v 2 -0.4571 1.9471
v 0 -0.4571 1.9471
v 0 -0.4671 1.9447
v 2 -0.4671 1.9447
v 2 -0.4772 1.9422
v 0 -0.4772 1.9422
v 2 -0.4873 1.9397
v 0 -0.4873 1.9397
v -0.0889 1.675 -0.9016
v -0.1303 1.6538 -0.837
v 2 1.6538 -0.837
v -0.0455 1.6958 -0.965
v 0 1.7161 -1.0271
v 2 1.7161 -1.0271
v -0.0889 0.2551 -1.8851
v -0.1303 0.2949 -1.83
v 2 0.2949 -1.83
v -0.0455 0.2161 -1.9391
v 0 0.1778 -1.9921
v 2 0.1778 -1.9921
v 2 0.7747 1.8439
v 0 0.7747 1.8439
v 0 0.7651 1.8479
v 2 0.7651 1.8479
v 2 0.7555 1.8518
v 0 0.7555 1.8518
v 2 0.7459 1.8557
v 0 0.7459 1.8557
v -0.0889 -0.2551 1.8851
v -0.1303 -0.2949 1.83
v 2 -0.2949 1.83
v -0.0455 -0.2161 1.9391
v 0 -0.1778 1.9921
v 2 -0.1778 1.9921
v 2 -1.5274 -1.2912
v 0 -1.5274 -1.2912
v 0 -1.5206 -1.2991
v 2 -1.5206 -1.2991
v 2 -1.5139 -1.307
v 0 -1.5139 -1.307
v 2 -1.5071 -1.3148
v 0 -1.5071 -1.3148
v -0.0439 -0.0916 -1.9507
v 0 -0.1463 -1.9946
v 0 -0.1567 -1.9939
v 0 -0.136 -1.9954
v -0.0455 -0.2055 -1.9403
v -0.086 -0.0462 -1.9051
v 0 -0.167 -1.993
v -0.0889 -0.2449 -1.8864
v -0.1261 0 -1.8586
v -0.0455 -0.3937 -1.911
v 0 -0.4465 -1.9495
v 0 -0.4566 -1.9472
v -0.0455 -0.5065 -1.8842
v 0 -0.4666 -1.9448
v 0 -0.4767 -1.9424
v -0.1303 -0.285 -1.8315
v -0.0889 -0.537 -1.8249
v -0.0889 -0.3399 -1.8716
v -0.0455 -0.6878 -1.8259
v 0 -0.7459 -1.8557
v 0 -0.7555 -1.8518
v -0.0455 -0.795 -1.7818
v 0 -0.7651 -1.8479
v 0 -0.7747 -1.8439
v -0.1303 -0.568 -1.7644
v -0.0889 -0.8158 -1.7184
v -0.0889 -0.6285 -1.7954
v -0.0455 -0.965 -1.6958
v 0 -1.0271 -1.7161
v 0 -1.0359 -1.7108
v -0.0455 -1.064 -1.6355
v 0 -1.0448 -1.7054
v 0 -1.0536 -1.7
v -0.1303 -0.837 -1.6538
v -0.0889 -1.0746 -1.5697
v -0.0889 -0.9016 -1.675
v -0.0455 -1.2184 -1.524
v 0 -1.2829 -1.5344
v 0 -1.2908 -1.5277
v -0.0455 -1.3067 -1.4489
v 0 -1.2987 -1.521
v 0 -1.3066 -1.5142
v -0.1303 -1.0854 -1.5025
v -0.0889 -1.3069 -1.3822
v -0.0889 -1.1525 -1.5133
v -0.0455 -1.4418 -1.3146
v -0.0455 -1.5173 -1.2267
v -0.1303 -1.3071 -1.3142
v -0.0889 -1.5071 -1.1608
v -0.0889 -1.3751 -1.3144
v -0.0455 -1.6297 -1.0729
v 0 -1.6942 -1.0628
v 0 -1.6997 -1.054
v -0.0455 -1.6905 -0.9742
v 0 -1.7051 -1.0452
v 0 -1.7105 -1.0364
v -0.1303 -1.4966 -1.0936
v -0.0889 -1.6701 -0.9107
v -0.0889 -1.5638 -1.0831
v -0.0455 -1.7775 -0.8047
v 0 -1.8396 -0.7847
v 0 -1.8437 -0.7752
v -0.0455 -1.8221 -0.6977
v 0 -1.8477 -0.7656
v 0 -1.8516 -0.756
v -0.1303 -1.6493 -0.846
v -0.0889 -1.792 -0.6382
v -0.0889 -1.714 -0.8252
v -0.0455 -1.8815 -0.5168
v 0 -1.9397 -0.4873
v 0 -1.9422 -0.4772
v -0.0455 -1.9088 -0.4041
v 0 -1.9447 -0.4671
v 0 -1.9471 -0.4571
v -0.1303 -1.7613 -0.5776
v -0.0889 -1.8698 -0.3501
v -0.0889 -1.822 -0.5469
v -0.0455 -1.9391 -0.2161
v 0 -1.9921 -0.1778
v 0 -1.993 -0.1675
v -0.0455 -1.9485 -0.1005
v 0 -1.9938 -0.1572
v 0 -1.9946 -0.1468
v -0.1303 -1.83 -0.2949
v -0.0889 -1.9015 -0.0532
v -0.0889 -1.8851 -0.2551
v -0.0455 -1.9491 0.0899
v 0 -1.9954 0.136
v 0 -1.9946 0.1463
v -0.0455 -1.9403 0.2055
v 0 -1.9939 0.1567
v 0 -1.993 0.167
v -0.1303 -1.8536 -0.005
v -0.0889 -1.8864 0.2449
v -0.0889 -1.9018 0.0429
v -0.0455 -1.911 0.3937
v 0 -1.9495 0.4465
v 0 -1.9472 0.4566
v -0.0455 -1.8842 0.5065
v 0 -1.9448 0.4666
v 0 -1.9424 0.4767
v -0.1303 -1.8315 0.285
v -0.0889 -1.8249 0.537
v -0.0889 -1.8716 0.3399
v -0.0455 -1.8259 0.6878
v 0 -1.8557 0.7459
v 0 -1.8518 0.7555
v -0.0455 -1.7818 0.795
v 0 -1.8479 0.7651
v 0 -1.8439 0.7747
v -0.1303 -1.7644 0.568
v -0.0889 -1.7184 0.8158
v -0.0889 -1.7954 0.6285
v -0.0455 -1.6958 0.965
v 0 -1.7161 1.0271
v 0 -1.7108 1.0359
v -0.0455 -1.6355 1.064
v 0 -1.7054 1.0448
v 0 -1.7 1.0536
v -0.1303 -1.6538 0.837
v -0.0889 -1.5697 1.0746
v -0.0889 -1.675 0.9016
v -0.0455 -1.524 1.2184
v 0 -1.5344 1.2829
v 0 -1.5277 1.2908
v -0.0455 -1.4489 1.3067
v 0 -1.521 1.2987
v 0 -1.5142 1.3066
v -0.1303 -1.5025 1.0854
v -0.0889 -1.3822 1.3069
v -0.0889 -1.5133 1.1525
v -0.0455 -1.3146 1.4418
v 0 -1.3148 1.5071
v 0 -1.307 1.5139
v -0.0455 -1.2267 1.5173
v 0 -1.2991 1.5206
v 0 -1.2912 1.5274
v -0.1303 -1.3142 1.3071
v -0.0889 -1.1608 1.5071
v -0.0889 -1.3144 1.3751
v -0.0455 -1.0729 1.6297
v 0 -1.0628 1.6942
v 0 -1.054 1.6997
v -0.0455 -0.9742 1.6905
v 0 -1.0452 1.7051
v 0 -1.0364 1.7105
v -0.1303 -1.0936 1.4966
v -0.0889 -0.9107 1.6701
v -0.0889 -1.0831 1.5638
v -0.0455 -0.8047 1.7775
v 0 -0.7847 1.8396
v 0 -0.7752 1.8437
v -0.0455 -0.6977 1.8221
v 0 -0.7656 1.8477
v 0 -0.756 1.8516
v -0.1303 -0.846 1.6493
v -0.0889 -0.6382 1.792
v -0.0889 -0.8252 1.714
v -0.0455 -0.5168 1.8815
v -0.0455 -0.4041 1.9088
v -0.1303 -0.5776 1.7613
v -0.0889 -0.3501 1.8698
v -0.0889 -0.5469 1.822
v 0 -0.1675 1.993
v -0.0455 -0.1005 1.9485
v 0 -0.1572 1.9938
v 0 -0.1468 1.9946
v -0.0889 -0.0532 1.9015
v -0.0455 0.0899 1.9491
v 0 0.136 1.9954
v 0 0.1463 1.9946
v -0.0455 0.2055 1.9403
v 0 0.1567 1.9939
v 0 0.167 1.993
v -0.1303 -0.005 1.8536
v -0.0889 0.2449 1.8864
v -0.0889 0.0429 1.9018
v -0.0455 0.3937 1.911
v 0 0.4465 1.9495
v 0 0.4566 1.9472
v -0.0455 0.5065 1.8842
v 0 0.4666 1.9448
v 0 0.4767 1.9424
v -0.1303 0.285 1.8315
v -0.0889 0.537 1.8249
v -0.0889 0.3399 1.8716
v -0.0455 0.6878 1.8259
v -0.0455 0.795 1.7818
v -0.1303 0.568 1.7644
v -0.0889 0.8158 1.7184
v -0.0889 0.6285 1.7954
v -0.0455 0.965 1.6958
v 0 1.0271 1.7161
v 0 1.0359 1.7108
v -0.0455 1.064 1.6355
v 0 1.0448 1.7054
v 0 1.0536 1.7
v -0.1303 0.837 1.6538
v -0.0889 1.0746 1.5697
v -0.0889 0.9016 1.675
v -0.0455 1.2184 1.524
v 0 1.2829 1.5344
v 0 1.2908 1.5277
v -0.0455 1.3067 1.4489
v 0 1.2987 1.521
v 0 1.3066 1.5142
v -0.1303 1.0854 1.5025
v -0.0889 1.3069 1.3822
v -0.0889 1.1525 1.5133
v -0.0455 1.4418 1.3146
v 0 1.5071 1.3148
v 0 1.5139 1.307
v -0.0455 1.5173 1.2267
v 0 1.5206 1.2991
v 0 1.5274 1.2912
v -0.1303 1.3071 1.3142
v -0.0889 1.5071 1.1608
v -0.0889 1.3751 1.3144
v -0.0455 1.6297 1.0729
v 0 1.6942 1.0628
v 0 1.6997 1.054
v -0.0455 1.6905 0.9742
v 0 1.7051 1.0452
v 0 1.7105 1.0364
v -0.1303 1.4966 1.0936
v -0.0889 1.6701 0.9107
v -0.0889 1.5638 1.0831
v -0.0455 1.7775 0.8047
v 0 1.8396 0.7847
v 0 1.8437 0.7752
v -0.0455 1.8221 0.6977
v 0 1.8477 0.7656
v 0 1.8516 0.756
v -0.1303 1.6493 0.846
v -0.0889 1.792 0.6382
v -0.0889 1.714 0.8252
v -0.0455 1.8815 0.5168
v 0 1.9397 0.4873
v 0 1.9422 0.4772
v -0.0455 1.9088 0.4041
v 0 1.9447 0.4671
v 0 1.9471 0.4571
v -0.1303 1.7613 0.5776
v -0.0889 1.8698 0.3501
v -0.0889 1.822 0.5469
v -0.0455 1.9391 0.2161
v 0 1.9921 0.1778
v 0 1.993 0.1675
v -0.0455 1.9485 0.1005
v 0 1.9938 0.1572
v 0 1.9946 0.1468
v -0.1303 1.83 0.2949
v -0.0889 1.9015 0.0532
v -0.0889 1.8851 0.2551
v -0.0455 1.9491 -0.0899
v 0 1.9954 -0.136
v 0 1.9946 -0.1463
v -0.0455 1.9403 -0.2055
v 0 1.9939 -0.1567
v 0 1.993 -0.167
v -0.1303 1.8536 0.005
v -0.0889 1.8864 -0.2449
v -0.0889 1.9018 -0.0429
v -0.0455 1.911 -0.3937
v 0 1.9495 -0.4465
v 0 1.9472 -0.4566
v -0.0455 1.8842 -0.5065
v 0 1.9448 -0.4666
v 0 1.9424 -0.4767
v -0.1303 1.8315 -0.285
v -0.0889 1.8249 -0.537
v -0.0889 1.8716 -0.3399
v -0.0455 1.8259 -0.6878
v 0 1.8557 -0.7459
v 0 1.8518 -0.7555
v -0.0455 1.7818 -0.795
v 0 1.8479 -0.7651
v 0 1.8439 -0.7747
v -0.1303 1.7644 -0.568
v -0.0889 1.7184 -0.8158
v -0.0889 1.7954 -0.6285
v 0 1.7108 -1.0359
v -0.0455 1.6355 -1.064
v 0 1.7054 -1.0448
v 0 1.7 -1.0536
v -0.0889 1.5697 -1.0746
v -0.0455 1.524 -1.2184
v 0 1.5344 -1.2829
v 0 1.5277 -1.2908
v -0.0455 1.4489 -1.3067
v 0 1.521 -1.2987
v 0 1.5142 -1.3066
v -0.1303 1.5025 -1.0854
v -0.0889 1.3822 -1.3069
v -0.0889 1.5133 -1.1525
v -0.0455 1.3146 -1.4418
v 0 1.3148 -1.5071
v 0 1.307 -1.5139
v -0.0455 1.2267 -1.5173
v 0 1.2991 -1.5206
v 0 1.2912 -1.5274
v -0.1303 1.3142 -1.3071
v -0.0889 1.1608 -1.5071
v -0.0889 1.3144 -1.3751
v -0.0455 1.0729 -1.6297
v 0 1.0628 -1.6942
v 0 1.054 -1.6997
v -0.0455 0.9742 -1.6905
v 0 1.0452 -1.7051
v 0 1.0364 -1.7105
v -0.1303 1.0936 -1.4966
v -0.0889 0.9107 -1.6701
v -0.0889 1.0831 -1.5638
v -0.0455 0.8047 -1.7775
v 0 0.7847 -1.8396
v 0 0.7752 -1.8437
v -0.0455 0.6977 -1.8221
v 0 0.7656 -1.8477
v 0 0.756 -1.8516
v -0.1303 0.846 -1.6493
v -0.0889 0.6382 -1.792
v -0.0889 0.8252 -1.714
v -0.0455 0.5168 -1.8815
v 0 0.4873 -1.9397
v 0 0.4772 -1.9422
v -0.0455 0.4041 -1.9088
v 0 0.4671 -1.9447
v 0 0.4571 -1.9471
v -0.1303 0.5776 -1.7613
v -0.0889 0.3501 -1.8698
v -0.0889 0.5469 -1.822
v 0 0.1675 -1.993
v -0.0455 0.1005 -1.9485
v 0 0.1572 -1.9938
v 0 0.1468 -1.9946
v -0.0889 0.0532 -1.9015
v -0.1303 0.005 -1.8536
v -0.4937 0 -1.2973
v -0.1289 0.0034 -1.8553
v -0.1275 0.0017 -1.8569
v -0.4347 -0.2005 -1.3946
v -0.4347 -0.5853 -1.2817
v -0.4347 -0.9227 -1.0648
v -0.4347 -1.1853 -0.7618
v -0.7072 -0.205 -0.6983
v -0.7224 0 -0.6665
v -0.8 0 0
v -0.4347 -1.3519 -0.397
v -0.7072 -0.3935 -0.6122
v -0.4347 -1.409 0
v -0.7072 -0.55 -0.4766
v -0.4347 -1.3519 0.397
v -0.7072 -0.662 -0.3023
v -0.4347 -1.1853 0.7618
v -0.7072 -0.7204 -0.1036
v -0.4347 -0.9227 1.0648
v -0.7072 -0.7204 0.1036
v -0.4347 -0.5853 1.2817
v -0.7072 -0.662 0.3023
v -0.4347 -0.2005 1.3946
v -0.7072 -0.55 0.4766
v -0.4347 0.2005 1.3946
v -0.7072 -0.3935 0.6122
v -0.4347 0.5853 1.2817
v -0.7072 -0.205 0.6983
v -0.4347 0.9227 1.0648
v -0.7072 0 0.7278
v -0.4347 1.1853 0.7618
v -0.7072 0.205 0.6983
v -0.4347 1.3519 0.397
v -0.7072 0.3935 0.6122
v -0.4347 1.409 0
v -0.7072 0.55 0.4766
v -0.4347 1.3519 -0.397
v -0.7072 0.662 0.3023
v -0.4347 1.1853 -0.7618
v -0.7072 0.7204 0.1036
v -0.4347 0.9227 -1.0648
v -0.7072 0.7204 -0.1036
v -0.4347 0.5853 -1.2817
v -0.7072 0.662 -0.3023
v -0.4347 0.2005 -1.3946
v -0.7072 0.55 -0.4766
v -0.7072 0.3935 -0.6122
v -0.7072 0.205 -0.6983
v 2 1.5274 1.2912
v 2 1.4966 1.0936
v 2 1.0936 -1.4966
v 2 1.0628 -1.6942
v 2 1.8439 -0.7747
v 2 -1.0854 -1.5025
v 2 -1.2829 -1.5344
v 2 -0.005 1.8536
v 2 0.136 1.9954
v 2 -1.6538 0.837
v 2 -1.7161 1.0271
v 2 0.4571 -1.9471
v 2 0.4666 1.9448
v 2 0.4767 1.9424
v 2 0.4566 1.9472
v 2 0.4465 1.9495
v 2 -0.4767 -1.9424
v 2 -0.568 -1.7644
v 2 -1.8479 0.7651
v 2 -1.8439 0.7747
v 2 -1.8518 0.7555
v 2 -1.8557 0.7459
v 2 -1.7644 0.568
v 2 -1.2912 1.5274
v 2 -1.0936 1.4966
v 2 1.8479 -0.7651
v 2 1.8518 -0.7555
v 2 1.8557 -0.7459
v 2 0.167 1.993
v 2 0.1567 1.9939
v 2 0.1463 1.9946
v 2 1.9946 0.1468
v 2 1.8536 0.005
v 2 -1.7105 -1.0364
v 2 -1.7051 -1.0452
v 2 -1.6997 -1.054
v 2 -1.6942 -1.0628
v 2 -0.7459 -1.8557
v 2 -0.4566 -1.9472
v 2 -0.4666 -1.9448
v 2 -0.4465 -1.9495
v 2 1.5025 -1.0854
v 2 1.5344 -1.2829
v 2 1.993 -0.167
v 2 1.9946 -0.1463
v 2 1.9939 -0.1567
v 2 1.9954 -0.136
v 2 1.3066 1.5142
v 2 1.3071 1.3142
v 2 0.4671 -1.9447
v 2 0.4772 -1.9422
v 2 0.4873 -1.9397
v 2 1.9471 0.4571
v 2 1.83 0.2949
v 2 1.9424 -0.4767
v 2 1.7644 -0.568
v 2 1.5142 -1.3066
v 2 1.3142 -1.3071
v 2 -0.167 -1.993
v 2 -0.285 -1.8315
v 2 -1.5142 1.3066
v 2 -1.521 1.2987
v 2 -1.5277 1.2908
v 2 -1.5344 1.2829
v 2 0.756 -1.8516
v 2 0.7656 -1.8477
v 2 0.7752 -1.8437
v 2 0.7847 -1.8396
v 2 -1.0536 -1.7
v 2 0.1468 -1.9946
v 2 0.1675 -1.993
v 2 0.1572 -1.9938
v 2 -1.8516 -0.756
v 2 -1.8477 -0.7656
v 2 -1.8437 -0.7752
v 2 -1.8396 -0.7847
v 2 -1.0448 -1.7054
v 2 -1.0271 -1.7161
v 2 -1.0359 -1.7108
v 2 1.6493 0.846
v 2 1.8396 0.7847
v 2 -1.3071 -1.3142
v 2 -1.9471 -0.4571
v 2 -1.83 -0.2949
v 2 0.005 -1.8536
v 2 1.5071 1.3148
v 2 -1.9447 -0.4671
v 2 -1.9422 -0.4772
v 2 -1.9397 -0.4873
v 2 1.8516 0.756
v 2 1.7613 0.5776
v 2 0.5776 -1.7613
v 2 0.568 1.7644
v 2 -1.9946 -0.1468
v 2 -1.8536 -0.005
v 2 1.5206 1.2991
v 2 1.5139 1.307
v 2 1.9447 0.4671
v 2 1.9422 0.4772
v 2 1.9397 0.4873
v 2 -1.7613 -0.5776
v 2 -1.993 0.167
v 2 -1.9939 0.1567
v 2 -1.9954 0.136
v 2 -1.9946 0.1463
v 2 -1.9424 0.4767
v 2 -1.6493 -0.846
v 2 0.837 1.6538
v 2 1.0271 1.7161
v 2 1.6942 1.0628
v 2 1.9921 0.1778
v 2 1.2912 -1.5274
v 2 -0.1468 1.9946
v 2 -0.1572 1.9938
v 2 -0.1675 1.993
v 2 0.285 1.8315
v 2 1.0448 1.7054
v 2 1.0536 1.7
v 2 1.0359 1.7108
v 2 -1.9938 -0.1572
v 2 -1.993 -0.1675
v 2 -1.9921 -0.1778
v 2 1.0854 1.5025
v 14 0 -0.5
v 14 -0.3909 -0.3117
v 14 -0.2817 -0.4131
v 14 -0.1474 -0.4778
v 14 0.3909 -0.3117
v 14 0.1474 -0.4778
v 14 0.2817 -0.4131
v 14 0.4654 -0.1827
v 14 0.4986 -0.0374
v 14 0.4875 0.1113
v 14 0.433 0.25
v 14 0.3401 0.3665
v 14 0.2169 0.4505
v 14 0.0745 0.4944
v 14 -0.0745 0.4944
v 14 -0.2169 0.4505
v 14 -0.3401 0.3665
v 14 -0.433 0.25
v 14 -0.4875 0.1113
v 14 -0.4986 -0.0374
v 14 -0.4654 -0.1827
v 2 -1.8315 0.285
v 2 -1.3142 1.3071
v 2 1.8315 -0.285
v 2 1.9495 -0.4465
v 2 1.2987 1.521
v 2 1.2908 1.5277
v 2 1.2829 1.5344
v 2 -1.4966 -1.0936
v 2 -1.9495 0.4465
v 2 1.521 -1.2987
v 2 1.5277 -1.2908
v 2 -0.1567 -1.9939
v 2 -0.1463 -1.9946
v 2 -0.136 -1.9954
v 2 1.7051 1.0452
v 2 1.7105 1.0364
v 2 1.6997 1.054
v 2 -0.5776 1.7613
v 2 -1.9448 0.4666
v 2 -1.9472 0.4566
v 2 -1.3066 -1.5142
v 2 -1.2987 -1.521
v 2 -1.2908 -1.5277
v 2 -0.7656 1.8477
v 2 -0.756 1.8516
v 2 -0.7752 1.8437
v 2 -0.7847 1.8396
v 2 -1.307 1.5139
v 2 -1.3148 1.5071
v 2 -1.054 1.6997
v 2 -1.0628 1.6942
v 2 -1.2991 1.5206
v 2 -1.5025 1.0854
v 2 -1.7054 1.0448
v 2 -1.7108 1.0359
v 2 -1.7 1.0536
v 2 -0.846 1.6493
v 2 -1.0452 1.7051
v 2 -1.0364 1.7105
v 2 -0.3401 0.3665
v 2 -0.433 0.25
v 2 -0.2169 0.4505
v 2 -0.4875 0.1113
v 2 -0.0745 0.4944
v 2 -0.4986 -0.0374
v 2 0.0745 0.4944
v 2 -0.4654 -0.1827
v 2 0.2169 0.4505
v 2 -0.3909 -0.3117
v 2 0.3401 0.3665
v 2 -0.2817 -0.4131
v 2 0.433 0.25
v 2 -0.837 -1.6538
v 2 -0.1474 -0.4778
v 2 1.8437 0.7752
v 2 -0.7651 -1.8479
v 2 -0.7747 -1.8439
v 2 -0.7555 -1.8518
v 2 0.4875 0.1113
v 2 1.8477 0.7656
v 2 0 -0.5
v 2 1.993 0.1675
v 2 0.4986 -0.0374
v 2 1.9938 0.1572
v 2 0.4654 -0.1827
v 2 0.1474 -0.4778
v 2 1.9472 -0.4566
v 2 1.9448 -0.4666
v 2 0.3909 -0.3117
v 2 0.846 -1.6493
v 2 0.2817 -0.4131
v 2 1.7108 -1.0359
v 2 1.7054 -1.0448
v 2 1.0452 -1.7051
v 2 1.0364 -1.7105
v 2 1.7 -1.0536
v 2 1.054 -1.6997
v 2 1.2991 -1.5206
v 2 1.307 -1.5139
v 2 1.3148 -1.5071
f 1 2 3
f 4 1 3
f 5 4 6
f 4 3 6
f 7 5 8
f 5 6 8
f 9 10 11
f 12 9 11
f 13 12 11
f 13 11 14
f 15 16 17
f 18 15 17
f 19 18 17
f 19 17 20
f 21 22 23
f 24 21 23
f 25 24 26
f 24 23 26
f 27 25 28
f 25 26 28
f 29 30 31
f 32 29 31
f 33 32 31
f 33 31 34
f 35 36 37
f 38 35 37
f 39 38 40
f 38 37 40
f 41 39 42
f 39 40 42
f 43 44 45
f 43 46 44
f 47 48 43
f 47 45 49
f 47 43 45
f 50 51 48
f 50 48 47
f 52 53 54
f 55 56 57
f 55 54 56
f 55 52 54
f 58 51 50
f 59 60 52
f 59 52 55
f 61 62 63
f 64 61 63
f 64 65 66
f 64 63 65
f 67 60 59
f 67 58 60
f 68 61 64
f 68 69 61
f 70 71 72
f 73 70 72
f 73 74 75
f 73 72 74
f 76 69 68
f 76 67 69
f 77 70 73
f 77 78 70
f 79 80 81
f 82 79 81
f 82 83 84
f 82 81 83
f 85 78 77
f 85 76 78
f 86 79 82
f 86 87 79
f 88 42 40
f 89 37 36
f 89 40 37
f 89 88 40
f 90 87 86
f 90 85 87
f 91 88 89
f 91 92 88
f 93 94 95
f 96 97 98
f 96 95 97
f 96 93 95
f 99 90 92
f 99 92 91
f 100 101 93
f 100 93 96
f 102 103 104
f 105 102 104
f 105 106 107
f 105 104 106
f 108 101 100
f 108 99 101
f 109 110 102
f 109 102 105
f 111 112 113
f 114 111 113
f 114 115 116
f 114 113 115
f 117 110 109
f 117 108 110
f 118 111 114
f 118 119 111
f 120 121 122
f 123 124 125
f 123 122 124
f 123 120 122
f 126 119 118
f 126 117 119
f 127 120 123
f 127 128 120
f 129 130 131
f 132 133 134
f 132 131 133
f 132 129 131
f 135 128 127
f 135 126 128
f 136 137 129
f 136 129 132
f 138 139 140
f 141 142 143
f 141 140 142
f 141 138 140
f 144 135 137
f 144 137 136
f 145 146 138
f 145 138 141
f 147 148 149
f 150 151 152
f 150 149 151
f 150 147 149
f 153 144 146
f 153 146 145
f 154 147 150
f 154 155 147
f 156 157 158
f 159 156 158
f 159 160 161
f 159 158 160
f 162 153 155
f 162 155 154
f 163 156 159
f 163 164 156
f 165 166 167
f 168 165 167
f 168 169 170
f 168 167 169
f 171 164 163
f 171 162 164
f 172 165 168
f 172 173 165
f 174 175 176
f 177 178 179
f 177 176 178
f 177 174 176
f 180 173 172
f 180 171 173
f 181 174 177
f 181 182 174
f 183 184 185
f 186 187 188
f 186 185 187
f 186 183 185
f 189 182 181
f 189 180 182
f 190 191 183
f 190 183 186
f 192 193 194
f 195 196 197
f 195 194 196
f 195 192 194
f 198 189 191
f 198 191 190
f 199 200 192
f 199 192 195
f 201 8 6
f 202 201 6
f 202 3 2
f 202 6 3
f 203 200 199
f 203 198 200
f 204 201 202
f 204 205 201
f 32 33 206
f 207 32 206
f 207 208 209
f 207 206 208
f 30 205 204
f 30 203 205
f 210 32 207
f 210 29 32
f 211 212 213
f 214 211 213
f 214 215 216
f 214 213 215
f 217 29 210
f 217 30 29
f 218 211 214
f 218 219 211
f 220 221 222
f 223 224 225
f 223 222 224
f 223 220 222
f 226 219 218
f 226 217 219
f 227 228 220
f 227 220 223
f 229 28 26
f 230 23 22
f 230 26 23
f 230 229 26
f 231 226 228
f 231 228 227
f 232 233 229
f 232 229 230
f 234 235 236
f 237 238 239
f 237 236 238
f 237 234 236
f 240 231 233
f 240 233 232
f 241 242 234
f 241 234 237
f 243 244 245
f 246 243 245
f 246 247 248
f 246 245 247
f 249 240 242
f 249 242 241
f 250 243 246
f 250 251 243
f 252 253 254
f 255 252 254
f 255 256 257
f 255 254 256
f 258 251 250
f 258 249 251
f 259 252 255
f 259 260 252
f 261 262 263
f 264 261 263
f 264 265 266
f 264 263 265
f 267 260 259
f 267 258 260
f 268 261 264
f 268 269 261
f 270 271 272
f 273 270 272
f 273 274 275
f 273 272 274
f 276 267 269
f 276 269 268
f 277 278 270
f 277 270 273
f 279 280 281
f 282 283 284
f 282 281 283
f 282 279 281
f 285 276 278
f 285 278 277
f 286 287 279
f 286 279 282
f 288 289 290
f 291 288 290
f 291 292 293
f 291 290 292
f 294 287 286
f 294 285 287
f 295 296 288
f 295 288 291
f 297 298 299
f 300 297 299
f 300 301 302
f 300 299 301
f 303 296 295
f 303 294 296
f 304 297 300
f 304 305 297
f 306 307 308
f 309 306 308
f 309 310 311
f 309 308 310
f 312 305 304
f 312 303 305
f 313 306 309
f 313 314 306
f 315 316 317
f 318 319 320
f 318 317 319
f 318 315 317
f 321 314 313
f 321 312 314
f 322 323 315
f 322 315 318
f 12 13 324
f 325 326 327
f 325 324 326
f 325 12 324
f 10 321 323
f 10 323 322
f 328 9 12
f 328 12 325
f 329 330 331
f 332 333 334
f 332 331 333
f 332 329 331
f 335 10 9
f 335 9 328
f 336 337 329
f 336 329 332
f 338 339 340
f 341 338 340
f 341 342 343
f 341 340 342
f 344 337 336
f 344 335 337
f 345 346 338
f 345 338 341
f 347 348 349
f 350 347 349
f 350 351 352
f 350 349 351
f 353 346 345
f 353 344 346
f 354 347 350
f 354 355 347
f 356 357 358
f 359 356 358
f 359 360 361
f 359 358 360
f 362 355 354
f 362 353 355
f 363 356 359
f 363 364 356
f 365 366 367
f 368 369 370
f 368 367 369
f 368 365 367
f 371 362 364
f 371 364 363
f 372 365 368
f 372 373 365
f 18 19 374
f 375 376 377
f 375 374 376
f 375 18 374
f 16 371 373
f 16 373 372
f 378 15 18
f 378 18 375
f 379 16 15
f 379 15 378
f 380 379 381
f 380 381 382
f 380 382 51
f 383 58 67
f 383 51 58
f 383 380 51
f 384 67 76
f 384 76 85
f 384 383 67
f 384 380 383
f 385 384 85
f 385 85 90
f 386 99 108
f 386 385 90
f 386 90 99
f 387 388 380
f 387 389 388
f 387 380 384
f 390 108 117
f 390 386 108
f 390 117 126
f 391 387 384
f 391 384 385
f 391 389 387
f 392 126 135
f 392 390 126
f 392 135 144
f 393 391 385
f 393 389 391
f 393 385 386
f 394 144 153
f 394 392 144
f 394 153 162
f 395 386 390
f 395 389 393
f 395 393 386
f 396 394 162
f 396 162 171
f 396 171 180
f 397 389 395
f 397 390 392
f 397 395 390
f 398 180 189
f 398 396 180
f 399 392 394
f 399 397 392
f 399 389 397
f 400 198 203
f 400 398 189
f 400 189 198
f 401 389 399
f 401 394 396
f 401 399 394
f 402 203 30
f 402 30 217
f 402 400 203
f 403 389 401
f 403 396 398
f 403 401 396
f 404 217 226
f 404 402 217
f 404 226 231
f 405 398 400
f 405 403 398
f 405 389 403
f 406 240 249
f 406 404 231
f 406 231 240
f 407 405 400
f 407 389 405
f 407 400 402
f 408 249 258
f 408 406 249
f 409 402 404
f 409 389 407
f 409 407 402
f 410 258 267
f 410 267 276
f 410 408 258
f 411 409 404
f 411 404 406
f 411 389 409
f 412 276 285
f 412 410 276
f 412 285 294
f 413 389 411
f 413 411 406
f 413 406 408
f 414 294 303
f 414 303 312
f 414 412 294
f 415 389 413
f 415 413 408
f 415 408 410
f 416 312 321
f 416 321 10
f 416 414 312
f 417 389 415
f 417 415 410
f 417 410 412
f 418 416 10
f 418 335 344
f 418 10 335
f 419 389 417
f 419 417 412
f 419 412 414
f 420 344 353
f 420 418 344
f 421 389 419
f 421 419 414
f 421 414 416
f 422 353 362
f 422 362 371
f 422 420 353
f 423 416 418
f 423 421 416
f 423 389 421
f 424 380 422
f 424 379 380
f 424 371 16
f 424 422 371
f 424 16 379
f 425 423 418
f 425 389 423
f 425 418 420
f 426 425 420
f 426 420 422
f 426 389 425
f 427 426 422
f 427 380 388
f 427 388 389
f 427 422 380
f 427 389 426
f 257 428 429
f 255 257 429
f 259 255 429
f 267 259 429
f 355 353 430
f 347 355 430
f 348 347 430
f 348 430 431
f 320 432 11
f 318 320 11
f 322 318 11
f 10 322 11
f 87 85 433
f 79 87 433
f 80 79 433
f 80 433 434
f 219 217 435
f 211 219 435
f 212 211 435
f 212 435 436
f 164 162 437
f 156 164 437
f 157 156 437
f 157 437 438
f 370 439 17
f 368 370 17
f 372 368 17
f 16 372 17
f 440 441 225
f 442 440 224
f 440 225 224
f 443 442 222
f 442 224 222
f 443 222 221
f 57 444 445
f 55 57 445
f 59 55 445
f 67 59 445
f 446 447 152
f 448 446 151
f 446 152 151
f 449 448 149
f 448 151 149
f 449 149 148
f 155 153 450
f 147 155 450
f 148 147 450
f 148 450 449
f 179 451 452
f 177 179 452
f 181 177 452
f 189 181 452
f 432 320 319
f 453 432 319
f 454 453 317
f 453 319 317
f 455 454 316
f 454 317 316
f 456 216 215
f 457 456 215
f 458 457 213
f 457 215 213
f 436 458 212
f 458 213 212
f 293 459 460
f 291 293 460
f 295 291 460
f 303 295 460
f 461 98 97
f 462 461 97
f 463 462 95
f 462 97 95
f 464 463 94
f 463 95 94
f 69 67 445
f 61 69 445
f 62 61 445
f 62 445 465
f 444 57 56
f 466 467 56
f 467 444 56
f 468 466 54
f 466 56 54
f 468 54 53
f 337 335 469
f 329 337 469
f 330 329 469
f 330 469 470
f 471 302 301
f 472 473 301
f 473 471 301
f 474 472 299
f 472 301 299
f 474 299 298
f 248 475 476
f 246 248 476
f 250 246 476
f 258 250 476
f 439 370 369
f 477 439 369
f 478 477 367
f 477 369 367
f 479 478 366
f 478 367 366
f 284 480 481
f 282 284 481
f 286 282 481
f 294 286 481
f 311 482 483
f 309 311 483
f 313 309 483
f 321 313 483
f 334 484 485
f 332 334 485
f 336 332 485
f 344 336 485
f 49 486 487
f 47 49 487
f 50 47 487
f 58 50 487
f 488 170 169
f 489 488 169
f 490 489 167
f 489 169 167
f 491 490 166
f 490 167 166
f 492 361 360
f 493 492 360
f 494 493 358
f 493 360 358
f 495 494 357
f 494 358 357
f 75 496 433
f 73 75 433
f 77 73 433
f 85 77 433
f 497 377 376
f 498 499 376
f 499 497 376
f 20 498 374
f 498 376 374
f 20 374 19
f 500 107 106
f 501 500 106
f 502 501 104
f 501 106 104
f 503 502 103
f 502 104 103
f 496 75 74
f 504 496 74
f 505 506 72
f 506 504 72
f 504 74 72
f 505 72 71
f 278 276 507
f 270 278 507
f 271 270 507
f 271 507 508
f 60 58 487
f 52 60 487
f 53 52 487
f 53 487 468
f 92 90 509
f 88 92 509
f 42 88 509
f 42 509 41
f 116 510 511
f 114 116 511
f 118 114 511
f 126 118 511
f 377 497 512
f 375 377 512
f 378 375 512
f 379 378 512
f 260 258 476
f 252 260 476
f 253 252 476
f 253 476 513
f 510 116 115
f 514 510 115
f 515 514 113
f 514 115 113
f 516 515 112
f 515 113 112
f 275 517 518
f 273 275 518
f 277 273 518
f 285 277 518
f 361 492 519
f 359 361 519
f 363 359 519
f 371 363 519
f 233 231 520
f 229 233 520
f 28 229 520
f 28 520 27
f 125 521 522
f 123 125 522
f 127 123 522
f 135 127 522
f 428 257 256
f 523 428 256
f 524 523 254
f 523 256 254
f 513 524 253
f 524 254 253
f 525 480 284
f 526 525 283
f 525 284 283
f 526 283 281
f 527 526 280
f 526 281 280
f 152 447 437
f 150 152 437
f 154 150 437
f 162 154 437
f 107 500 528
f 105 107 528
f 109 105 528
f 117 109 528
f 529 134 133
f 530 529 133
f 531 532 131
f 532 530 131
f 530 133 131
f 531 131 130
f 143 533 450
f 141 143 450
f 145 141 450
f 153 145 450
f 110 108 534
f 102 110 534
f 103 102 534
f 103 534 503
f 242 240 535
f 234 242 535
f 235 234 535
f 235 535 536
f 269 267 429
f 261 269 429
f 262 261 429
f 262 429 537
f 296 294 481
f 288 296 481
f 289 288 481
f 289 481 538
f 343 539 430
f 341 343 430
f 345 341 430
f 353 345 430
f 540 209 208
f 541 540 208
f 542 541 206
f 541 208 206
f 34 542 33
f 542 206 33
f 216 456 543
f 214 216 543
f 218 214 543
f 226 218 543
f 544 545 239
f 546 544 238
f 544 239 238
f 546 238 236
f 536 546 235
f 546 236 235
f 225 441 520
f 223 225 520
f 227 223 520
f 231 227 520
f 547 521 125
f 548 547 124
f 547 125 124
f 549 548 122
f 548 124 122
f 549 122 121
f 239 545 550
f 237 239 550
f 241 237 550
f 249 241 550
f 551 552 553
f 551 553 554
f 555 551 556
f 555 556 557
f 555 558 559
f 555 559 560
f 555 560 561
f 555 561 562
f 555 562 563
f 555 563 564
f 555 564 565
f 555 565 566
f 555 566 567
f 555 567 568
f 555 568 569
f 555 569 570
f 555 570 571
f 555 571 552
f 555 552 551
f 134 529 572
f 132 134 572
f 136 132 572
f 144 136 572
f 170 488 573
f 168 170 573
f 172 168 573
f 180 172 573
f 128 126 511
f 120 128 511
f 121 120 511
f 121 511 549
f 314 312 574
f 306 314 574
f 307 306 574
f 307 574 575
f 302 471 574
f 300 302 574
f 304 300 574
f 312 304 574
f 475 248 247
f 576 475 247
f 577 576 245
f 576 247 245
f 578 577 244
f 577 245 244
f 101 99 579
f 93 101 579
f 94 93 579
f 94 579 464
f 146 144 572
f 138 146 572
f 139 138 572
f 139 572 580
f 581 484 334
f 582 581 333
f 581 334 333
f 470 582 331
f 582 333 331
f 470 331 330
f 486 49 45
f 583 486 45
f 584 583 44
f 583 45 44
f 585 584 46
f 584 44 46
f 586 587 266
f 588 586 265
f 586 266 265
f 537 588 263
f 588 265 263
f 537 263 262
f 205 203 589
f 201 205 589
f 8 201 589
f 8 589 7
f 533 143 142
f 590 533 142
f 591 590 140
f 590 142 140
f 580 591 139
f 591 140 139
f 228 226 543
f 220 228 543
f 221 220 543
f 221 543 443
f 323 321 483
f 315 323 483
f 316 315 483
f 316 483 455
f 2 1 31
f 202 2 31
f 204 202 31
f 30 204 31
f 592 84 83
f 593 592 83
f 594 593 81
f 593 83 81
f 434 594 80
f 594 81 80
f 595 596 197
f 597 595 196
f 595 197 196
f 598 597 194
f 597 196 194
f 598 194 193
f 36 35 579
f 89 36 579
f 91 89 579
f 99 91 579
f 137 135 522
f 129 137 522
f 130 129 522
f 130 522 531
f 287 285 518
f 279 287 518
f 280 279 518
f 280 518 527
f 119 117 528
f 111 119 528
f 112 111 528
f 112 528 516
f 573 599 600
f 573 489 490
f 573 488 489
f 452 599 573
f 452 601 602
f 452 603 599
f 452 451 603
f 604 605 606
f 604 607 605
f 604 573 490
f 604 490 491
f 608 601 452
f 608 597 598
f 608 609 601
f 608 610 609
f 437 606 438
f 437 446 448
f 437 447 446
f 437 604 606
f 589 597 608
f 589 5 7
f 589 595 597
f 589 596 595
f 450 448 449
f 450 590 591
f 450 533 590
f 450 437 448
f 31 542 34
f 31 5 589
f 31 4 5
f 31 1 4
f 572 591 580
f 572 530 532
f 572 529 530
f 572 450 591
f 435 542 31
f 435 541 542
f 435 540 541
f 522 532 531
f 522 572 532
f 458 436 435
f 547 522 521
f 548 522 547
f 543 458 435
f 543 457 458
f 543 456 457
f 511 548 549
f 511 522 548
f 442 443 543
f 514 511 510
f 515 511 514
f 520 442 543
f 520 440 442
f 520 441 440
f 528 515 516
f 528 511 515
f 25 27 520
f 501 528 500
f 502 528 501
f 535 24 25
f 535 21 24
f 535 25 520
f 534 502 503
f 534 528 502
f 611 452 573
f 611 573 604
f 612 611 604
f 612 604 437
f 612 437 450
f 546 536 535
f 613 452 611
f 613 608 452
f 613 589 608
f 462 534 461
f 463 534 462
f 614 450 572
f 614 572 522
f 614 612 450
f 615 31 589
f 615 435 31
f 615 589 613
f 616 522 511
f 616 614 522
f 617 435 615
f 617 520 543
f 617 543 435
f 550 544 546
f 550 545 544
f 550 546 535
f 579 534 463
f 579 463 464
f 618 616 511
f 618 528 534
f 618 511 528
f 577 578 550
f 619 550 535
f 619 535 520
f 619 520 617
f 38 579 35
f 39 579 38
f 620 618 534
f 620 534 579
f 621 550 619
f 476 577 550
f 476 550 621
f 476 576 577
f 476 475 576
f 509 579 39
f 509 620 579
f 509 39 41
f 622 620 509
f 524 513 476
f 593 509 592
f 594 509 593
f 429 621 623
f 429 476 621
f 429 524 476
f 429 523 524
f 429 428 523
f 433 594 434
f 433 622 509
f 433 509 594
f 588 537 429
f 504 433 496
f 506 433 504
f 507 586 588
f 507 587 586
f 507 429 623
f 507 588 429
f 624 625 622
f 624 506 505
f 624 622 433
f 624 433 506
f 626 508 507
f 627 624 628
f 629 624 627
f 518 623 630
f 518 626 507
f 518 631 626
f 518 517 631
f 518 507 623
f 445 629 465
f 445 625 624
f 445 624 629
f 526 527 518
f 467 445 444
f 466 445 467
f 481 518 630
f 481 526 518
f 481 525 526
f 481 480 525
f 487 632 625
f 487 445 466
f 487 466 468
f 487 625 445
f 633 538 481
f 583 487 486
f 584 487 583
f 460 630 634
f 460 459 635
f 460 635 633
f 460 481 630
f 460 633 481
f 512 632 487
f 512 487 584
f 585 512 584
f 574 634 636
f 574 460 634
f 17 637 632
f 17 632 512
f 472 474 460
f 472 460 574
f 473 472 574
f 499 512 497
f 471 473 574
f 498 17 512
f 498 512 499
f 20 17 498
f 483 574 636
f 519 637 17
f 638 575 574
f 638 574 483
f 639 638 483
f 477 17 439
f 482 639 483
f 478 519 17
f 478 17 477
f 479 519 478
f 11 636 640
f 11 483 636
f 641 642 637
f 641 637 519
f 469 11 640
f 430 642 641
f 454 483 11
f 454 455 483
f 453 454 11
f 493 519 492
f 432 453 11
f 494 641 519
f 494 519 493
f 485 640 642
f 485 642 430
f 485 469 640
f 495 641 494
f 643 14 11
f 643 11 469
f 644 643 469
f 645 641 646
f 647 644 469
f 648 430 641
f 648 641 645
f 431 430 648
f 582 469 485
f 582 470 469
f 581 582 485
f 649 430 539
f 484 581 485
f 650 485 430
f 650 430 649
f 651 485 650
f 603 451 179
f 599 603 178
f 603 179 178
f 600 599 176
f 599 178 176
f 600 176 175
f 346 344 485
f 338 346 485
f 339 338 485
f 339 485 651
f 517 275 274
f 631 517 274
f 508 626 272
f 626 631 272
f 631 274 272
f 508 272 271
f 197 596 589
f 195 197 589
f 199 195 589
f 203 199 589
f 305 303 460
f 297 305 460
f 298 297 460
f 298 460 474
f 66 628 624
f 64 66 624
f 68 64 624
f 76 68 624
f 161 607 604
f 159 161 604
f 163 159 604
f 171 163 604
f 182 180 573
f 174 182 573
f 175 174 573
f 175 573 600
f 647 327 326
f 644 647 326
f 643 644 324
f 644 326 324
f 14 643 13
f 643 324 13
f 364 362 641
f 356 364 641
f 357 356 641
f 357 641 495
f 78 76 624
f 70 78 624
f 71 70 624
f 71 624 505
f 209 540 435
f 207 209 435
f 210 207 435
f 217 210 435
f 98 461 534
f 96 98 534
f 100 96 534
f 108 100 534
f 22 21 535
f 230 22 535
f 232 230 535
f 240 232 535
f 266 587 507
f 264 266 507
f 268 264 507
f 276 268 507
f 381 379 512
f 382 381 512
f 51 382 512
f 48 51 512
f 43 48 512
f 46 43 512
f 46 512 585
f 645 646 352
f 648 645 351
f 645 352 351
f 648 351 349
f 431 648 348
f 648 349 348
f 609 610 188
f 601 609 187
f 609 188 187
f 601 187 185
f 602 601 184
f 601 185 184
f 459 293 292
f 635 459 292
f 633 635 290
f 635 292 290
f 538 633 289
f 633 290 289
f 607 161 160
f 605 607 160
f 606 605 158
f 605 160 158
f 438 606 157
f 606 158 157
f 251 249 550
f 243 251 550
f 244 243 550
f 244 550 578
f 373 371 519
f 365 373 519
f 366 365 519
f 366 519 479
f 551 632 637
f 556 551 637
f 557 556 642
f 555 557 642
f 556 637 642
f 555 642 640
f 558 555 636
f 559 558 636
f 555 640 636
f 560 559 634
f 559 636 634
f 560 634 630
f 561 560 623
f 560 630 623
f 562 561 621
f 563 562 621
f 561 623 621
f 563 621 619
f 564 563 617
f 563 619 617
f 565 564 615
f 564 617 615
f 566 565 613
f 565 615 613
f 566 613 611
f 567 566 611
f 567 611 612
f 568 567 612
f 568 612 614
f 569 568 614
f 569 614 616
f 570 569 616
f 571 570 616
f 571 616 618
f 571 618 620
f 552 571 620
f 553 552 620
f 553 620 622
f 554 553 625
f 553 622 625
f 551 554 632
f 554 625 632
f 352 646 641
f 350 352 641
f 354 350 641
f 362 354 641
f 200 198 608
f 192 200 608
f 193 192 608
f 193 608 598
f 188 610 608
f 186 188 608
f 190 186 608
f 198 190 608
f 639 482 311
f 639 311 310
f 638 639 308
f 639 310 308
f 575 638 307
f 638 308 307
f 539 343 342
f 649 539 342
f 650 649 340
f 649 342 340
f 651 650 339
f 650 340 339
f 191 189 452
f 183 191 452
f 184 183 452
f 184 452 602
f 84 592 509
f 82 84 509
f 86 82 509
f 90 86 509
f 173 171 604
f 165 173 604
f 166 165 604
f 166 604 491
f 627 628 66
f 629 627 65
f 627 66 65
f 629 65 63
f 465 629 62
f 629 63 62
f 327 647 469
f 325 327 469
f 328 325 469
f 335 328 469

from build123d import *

# Parameters (mm, degrees)
SKETCH1_R           = 2
BOSS_EXTRUDE1_DEPTH = 2
SKETCH2_R           = 0.5
BOSS_EXTRUDE2_DEPTH = 12
DOME1_FACE_RADIUS   = 2
DOME1_HEIGHT        = 0.8
CUT_EXTRUDE1_DEPTH  = 3.8
CIRPATTERN1_COUNT   = 40


with BuildPart() as part:
    # Sketch1 → Boss-Extrude1 (new body)
    with BuildSketch(Plane(origin=(0, 0, 0), x_dir=(0, 0, -1), z_dir=(1, 0, 0))):
        Circle(SKETCH1_R)
    extrude(amount=BOSS_EXTRUDE1_DEPTH)

    # Sketch2 → Boss-Extrude2 (add)
    with BuildSketch(Plane(origin=(2, 0, 0), x_dir=(0, 0, -1), z_dir=(1, 0, 0))):
        Circle(SKETCH2_R)
    extrude(amount=BOSS_EXTRUDE2_DEPTH)

    # Dome1: a dome of height H over a round flat face of radius A is a cap of a sphere of radius (A * A + H * H) / (2 * H)
    dome1_r = (DOME1_FACE_RADIUS * DOME1_FACE_RADIUS + DOME1_HEIGHT * DOME1_HEIGHT) / (2 * DOME1_HEIGHT)
    dome1_base = Plane((0, 0, 0), z_dir=(-1, 0, 0))
    with Locations(dome1_base.offset(DOME1_HEIGHT - dome1_r)):
        dome1_ball = Sphere(dome1_r, mode=Mode.PRIVATE)
    add(split(dome1_ball, bisect_by=dome1_base, keep=Keep.TOP, mode=Mode.PRIVATE))

    # Sketch3 → Cut-Extrude1 (cut, through all)
    with BuildSketch(Plane(origin=(2, 0, 0), x_dir=(0, 0, -1), z_dir=(1, 0, 0))):
        with BuildLine():
            Line((-0.005039775, 1.853565527), (0.135996541, 1.995370878))
            ThreePointArc((0.135996541, 1.995370878), (-0.005437904, 1.999992607), (-0.146845126, 1.994601842))
            Line((-0.146845126, 1.994601842), (-0.005039775, 1.853565527))
        make_face()
    cut_extrude1 = extrude(amount=-CUT_EXTRUDE1_DEPTH, mode=Mode.SUBTRACT)

    # CirPattern1: Cut-Extrude1 ×40 about axis
    cirpattern1_axis = Axis((0, 0, 0), (1, 0, 0))
    for i in range(1, CIRPATTERN1_COUNT):
        add(cut_extrude1.rotate(cirpattern1_axis, i * 360 / CIRPATTERN1_COUNT), mode=Mode.SUBTRACT)


solid = part.part
